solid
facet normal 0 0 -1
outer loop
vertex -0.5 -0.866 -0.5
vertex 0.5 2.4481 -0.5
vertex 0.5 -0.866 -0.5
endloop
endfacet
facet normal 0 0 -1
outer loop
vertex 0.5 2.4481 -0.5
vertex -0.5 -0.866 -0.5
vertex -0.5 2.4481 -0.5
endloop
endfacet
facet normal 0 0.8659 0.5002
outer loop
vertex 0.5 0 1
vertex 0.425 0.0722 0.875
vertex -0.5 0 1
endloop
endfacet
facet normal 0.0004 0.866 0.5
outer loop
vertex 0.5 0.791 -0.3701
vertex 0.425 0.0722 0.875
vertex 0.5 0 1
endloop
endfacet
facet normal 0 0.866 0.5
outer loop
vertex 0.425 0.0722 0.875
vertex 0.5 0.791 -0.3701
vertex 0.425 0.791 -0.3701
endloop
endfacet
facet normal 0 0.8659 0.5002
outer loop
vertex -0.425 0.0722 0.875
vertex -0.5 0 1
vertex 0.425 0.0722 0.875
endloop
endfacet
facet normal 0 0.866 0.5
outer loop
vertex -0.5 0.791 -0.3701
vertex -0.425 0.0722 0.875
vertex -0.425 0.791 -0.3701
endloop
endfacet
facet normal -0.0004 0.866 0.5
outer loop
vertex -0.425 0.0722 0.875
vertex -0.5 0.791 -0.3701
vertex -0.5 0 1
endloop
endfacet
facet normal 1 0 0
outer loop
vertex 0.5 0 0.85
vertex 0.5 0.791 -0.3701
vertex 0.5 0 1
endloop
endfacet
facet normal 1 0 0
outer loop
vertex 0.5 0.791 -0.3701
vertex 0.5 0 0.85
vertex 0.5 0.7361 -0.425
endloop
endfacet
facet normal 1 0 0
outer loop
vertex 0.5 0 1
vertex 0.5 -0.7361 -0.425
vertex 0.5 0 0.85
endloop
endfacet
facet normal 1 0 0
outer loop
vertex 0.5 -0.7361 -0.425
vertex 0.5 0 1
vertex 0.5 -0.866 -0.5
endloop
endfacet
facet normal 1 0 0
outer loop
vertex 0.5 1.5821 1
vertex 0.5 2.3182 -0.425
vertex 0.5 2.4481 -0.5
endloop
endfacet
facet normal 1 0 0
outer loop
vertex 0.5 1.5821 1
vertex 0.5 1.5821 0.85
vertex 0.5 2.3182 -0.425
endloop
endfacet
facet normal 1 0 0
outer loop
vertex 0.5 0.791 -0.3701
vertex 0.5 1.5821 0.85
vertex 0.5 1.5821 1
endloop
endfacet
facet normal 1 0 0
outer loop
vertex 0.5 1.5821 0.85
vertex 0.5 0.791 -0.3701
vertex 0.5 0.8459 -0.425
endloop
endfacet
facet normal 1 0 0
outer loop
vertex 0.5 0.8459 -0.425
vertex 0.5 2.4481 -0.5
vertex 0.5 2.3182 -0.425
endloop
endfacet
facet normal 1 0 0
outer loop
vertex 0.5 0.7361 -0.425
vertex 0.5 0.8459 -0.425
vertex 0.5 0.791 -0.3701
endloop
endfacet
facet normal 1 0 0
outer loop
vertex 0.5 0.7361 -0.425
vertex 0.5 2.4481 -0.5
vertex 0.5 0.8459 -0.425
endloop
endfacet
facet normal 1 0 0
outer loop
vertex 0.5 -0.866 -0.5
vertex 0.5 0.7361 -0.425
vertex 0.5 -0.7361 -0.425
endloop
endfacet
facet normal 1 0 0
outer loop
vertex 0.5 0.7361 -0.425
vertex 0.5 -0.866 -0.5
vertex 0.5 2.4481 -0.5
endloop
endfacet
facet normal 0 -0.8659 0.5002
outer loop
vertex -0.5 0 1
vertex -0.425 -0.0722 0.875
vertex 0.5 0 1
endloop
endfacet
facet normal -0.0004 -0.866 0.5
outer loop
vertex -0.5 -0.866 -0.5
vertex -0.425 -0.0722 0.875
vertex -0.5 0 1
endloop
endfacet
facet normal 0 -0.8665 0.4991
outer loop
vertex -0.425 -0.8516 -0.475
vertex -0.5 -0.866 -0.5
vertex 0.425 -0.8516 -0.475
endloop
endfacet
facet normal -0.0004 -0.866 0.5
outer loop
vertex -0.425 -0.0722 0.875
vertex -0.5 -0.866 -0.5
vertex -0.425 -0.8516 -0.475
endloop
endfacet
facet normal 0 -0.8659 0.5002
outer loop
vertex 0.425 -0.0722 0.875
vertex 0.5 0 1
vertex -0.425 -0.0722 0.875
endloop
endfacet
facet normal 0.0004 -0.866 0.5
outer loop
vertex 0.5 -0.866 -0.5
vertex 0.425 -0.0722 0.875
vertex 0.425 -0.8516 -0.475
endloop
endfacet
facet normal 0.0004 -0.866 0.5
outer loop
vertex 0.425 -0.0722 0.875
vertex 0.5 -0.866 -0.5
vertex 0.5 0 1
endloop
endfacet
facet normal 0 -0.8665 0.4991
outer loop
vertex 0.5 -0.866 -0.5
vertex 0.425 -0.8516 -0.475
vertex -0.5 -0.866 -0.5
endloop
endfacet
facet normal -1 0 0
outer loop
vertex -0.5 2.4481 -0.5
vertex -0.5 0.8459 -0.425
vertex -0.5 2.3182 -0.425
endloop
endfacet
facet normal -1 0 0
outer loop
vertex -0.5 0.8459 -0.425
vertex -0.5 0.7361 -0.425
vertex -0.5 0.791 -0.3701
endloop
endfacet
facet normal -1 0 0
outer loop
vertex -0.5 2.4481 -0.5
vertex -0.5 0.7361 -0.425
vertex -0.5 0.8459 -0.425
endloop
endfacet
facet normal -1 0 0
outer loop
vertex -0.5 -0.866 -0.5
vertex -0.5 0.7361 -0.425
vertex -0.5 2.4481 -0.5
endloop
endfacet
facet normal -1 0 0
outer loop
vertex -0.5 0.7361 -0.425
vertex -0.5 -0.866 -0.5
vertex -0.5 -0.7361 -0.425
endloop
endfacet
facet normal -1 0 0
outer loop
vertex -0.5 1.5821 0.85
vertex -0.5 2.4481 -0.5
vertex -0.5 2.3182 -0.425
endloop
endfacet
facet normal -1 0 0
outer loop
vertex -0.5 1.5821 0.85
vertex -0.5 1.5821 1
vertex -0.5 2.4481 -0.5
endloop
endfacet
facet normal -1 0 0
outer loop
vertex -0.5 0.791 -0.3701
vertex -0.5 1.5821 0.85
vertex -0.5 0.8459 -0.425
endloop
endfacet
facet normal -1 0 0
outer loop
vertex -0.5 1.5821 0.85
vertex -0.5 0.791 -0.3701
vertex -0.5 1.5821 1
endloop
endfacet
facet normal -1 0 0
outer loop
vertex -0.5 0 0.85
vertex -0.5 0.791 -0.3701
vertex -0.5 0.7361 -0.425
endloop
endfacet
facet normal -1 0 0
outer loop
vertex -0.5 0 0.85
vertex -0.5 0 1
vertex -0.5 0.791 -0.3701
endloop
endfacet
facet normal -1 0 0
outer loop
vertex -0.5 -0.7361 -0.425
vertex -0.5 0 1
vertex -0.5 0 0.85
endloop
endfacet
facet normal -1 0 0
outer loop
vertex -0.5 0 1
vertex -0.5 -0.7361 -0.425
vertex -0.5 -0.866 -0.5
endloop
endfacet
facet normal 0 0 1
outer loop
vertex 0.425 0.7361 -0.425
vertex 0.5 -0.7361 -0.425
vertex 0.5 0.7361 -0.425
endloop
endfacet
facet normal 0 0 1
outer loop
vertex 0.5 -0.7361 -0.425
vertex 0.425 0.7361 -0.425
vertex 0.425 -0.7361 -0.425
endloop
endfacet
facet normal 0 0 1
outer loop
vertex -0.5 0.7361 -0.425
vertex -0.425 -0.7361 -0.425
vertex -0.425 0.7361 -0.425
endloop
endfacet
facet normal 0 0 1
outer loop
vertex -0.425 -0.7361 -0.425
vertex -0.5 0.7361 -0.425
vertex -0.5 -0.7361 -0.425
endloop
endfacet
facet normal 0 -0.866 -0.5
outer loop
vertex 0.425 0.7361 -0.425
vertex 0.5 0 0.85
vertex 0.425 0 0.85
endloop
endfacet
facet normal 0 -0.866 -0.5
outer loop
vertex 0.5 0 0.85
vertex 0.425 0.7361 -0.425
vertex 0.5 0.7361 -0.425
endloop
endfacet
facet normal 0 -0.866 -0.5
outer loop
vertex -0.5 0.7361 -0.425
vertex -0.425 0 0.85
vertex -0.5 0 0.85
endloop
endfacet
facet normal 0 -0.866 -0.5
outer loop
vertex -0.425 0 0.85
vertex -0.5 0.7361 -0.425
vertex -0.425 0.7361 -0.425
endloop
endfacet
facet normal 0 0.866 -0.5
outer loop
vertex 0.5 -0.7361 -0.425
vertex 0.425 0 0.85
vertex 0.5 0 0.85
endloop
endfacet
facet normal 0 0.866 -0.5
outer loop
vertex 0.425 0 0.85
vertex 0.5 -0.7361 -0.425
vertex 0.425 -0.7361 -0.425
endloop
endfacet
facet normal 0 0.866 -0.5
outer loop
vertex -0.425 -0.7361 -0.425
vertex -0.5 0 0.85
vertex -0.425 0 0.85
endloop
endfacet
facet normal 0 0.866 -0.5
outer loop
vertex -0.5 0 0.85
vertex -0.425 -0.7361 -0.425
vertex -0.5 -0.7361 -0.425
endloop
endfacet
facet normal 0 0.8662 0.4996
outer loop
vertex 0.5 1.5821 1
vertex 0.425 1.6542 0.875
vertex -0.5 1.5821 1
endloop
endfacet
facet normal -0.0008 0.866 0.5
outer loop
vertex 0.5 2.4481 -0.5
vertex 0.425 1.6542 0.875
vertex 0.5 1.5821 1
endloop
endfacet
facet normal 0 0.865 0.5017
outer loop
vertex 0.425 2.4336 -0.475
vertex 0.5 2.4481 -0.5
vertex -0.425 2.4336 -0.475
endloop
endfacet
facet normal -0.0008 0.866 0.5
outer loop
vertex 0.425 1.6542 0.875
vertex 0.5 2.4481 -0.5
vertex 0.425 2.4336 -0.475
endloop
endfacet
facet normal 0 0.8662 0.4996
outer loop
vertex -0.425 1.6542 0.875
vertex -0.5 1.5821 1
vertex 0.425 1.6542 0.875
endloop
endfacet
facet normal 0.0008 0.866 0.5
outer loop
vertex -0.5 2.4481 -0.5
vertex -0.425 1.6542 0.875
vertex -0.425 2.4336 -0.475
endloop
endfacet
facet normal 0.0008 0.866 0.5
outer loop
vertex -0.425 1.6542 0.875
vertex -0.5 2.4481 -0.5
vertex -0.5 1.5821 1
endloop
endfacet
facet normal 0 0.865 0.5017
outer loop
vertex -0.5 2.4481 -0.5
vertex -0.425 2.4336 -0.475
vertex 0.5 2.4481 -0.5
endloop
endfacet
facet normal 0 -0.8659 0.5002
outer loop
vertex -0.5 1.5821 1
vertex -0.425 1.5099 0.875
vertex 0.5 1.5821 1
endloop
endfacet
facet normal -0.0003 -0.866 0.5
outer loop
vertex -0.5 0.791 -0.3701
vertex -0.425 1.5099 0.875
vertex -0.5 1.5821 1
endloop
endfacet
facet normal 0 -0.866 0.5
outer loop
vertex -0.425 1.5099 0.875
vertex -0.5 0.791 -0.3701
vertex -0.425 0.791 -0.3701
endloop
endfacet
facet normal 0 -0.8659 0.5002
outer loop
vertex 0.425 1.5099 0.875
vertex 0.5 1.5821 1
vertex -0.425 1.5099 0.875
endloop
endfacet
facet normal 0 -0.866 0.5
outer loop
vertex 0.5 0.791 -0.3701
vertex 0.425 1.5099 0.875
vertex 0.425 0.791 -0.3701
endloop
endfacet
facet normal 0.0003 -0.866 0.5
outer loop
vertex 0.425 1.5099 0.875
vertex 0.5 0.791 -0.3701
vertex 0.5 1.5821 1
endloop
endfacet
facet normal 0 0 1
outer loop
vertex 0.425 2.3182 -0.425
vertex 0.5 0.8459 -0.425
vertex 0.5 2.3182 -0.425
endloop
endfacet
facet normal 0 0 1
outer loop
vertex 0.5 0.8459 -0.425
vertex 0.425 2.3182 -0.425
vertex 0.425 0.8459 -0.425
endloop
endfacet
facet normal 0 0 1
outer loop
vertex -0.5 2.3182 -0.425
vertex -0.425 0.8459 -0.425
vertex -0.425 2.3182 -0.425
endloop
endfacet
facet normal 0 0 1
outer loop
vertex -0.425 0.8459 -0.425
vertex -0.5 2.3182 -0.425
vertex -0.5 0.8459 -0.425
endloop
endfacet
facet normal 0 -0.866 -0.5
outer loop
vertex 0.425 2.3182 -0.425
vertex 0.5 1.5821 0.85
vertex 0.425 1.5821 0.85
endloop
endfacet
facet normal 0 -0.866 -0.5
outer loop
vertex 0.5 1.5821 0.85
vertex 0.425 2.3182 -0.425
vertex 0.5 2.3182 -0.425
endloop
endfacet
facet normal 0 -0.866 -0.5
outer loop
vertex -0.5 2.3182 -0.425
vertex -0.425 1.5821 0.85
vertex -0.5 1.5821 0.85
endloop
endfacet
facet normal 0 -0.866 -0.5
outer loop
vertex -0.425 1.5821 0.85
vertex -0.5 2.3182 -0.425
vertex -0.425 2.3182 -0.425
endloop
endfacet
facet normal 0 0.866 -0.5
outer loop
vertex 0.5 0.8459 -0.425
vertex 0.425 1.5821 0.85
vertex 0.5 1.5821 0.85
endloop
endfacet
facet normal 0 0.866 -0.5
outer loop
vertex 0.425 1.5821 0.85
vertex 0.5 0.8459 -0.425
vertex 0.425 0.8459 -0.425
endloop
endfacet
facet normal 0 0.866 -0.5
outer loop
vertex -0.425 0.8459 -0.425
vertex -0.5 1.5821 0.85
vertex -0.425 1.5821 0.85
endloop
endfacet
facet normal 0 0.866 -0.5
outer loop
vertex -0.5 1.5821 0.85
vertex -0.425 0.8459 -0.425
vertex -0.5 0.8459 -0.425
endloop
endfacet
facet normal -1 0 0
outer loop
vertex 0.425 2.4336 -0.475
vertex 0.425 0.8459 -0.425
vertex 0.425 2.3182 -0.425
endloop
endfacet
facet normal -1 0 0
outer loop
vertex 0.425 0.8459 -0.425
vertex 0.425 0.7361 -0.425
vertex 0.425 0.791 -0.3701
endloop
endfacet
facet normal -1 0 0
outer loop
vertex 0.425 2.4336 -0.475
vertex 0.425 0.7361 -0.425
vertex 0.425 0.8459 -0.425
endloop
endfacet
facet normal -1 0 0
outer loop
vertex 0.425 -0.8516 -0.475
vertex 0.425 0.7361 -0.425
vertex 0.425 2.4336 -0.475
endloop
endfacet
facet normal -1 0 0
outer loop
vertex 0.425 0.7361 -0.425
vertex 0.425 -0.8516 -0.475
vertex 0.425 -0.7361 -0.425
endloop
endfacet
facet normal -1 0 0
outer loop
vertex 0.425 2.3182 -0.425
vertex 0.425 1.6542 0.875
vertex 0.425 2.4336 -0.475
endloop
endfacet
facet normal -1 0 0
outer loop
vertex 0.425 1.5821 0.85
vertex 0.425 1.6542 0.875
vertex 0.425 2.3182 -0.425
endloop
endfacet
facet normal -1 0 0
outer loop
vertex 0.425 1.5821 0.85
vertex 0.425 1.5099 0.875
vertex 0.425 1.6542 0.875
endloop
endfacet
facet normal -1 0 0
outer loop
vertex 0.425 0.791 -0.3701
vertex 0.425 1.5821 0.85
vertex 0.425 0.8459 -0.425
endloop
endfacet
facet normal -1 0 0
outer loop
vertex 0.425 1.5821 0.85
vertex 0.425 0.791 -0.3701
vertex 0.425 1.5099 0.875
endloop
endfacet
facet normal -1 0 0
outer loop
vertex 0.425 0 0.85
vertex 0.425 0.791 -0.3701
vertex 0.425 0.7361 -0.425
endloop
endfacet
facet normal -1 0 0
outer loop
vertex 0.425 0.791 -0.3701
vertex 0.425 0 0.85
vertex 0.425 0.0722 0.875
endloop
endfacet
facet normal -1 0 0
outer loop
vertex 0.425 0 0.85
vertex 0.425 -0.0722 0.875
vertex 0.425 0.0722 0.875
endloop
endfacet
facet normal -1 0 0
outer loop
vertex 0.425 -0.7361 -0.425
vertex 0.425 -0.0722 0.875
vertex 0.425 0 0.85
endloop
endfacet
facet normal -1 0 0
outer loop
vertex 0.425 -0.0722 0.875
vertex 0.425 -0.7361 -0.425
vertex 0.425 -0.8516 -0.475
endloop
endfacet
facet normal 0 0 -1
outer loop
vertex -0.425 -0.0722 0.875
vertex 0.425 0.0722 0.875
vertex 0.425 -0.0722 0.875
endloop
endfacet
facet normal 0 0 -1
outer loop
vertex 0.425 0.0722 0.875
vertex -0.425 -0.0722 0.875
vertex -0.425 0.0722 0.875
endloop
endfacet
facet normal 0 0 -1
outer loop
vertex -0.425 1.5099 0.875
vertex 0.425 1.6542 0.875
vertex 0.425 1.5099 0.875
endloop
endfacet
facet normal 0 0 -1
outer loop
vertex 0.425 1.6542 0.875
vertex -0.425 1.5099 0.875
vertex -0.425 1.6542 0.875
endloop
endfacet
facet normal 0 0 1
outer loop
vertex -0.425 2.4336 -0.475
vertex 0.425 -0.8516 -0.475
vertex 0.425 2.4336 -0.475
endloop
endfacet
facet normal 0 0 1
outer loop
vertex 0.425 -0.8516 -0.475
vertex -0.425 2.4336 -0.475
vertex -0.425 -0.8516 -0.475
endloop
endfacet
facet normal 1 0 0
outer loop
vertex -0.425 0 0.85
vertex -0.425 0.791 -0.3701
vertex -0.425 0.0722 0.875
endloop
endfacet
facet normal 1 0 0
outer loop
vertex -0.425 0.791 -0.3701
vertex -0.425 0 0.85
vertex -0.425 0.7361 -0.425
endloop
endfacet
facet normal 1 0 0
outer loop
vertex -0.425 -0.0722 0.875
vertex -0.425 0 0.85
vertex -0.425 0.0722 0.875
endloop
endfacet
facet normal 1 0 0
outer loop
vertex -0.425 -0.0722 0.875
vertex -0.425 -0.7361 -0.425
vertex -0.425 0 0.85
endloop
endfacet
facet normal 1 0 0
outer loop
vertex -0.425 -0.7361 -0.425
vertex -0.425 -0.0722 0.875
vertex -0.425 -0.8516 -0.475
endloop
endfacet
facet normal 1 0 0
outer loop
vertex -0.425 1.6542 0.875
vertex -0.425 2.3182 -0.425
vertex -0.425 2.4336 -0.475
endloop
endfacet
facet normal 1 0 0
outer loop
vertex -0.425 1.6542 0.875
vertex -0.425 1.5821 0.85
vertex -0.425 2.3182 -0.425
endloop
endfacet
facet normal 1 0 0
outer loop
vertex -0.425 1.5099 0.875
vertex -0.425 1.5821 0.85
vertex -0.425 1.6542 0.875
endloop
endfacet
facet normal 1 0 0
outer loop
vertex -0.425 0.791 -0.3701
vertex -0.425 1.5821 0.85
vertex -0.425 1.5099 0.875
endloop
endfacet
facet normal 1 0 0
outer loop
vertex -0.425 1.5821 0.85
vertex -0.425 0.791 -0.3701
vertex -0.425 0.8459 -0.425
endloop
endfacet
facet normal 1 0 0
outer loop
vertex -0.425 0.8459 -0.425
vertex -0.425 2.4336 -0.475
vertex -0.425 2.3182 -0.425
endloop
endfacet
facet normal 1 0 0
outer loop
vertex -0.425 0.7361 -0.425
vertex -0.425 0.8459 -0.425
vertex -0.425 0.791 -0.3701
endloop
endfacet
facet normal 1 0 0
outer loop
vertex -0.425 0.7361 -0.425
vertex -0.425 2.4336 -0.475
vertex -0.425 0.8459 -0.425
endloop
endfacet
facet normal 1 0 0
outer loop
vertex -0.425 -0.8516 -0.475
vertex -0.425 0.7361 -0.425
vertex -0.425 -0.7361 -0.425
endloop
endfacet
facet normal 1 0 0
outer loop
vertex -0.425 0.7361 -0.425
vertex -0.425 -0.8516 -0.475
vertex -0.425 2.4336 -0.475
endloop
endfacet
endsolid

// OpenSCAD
/**
In original scale of [1,1,1], The form factor are
length, 4*cos(30) - thickness
height = 1 + sin(30)
depth is h
**/
scale([1,1,1]){
thickness = 0.15;

difference(){


scale([1,1,-1]){
    rotate([0,90,0]){
difference(){
  cylinder(r = 1, h =1, $fn = 3, center = true);

  cylinder(r = 1-thickness, h =2, $fn = 3, center = true);
  }
  translate([0,2*cos(30)-thickness,0]){
  difference(){
  cylinder(r = 1, h =1, $fn = 3, center = true);

  cylinder(r = 1-thickness, h =2, $fn = 3, center = true);
  }
  }  
 
  }
  }
  
  translate([0,0,thickness+0.05]){
cube([1 - thickness, 4*cos(30)+5,1+sin(30)-thickness+0.0],center = true);
}
  
  }
}
